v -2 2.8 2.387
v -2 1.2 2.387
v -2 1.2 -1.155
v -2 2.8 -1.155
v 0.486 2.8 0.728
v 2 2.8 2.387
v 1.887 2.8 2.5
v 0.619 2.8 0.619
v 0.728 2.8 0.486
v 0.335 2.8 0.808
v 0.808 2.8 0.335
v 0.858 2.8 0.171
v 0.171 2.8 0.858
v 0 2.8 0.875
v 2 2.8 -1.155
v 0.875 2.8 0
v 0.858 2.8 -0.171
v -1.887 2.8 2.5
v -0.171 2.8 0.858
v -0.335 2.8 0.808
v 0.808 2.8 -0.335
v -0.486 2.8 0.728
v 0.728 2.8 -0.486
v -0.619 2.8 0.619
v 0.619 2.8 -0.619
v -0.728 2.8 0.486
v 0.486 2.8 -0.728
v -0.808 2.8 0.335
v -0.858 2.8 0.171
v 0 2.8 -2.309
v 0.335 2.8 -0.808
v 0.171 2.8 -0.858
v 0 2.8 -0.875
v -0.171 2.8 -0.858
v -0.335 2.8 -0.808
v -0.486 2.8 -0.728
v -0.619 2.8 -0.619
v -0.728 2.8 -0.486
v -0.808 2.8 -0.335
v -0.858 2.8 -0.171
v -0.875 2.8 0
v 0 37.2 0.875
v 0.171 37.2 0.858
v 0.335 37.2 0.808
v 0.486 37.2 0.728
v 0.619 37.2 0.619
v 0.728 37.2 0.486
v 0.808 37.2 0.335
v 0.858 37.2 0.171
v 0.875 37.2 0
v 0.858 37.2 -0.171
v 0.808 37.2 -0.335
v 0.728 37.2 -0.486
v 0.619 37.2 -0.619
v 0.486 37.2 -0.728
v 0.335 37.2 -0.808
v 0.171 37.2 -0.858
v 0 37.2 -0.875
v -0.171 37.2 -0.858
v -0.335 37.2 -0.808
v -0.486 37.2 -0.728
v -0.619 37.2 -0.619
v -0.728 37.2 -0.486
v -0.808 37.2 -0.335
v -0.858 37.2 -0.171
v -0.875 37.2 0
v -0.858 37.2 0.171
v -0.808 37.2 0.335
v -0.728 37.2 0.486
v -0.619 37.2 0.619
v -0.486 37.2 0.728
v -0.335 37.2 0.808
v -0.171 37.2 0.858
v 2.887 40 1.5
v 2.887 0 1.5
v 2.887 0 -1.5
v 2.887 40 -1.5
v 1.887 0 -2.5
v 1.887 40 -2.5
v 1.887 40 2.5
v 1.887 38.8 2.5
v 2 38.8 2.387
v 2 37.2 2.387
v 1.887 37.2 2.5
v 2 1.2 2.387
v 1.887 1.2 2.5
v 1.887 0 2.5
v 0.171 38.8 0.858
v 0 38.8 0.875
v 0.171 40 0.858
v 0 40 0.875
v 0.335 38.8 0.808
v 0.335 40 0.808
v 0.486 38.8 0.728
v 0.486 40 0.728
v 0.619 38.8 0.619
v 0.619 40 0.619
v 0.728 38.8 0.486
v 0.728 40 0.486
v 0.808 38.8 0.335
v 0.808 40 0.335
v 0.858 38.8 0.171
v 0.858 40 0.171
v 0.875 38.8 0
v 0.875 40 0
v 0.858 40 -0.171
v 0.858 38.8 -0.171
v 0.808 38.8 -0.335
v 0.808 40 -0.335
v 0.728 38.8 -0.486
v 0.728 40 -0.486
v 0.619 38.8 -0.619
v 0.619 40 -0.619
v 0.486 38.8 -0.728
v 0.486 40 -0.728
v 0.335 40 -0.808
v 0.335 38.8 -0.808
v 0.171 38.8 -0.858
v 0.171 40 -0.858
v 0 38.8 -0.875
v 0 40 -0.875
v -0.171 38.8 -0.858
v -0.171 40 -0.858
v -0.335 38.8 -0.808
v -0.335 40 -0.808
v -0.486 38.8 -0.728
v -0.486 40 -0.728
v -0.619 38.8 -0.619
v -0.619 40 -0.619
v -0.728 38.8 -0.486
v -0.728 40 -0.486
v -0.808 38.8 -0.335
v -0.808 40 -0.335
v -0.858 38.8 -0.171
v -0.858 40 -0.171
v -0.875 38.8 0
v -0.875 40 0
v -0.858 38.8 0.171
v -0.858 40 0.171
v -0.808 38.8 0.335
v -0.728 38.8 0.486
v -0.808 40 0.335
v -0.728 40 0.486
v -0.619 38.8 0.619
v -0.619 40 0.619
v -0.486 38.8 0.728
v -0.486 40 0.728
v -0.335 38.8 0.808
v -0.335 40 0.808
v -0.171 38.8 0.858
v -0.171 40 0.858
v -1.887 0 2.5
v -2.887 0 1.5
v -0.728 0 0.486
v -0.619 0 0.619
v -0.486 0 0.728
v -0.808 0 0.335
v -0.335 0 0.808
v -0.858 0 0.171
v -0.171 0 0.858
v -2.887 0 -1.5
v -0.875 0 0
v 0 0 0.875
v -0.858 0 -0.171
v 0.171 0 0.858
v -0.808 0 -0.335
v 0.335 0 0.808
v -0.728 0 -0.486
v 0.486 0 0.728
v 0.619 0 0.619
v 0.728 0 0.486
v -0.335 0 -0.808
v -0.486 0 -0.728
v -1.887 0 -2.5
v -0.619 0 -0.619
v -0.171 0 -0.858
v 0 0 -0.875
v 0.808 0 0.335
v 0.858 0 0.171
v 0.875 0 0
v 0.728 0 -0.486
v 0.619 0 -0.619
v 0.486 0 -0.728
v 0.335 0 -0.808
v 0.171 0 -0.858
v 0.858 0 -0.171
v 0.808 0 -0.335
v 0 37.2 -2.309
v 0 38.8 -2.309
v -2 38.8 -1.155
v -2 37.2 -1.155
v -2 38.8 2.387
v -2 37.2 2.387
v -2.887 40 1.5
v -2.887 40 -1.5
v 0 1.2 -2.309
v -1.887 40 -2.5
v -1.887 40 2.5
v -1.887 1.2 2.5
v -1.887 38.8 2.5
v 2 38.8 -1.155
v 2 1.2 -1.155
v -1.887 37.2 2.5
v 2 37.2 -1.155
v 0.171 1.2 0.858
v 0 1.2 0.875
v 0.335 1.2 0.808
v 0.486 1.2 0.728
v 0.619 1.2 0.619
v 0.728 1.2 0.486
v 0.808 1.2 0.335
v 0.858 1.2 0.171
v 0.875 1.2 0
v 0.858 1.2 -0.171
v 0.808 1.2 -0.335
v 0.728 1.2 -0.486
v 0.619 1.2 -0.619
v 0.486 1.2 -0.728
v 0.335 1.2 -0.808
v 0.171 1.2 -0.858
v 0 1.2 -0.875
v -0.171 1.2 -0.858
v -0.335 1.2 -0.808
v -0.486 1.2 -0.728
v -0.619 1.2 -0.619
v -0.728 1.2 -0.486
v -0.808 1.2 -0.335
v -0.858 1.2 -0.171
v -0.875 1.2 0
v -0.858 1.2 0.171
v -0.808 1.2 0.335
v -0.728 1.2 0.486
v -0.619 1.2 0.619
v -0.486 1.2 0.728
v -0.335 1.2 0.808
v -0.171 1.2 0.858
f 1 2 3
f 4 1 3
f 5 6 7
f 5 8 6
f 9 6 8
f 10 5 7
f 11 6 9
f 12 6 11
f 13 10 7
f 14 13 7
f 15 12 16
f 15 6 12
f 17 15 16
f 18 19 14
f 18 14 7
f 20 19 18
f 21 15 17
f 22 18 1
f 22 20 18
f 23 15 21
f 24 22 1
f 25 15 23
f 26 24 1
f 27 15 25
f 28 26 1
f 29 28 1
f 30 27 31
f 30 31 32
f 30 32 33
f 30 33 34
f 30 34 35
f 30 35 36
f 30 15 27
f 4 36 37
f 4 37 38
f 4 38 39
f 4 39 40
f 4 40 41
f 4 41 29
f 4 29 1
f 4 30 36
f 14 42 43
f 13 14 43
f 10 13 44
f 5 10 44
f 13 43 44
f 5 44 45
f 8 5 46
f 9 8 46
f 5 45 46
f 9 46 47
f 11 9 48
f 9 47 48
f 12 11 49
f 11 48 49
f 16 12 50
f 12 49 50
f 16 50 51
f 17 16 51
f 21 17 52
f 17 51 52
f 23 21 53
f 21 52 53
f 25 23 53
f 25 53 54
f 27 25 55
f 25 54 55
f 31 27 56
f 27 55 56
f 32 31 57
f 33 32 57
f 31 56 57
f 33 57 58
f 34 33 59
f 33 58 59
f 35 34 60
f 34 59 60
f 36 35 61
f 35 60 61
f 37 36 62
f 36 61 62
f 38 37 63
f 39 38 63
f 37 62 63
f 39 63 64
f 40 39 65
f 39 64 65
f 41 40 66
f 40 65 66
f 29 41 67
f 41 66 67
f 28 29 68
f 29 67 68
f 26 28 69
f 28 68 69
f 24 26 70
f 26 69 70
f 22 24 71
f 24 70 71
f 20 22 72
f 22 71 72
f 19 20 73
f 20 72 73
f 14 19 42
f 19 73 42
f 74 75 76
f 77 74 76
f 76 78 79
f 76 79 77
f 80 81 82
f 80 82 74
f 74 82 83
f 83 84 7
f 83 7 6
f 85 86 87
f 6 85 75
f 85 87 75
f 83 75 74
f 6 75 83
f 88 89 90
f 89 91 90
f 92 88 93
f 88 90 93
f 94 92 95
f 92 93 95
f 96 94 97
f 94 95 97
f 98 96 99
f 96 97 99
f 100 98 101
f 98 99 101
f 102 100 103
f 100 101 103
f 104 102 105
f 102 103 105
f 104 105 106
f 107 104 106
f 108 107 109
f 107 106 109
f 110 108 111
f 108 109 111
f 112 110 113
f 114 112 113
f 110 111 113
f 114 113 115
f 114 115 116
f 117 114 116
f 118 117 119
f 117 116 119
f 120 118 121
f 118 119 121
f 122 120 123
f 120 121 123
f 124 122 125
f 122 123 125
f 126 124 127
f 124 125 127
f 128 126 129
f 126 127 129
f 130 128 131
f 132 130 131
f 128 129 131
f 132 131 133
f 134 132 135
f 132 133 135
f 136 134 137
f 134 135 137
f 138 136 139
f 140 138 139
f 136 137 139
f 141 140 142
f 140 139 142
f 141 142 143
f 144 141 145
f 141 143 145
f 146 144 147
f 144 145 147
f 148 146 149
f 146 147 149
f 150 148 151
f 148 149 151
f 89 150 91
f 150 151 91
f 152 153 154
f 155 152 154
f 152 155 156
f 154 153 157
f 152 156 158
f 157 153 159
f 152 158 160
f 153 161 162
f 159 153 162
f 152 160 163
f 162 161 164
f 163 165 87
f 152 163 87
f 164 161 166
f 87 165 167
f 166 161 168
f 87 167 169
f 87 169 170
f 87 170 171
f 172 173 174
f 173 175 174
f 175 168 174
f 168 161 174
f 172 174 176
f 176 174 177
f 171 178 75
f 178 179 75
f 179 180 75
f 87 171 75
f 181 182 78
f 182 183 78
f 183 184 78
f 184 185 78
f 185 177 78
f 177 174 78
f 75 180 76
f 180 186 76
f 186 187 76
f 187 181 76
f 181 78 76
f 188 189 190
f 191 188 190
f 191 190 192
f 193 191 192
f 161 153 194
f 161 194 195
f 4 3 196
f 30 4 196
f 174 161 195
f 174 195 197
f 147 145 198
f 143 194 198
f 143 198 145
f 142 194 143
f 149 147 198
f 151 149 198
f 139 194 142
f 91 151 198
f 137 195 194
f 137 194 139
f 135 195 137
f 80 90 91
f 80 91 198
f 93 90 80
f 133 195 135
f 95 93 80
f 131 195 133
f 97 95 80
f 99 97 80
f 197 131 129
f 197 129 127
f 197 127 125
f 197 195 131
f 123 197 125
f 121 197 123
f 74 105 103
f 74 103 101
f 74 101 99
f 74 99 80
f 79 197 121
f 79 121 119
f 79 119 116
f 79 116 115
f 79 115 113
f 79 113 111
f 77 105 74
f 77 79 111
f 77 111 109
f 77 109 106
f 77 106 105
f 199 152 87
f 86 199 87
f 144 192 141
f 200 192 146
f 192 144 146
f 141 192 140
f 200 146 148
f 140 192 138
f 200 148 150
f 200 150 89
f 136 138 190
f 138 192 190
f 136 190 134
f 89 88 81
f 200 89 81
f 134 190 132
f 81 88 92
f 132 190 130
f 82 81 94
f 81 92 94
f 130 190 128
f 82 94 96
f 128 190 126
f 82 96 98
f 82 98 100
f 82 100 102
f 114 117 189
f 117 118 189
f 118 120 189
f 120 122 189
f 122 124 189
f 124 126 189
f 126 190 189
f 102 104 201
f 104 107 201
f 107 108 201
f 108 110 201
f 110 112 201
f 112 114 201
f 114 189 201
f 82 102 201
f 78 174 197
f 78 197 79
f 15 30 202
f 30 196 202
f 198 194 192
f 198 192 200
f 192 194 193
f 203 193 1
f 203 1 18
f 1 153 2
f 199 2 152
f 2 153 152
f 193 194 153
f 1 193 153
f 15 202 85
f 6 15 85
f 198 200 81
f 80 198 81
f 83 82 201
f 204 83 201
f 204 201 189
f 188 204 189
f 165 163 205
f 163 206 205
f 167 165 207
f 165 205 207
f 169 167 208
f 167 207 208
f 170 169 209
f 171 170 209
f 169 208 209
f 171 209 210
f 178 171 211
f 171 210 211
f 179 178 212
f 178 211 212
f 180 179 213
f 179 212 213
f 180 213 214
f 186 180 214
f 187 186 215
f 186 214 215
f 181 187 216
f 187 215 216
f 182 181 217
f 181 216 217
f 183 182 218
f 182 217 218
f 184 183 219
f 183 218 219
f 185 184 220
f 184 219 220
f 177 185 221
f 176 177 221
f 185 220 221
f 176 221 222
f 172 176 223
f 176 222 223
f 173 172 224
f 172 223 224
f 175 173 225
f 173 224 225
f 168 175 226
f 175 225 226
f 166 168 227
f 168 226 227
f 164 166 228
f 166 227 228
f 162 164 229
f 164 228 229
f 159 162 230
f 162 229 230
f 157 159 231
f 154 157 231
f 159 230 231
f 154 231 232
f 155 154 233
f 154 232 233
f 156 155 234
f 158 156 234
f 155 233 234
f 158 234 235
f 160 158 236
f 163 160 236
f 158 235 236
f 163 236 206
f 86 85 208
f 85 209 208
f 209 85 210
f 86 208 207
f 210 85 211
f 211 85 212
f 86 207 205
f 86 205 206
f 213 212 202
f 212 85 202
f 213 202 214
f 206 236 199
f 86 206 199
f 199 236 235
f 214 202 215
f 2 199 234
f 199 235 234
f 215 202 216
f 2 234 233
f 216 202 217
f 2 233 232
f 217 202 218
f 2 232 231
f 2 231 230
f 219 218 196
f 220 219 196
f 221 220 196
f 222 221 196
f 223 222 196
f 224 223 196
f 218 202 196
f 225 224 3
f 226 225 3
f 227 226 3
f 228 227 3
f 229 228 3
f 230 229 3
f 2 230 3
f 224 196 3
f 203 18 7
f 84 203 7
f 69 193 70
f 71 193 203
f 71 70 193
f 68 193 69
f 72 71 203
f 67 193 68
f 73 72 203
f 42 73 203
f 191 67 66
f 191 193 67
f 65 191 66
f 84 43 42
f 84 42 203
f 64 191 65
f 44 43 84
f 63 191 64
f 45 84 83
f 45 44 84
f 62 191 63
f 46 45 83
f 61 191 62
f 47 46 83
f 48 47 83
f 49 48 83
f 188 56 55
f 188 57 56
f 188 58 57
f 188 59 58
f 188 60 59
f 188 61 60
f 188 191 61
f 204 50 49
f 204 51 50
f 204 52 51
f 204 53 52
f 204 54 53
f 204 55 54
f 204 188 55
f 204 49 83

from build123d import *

# Parameters (mm, degrees)
SKETCH_1_W              = 5.773502692
SKETCH_1_H              = 5
EXTRUDE_1_DEPTH         = 40
M2_2X0_45_1_D           = 1.75
M2_2X0_45_1_ON_FACE_2_D = 1.75
CUT_EXTRUDE_1_DEPTH     = 0.8
CUT_EXTRUDE_2_DEPTH     = 0.8
CHAMFER_1_SIZE          = 1


with BuildPart() as part:
    # 草图1 → 凸台-拉伸1 (new body)
    with BuildSketch(Plane(origin=(0, 0, 0), x_dir=(1, 0, 0), z_dir=(0, 1, 0))):
        Rectangle(SKETCH_1_W, SKETCH_1_H)
    extrude(amount=EXTRUDE_1_DEPTH)

    # M2.2x0.45 螺纹孔1 (through all)
    with Locations(Plane(origin=(0, 0, 0), x_dir=(0, 0, -1), z_dir=(0, -1, 0))):
        with Locations((0, 0)):
            Hole(M2_2X0_45_1_D / 2)

    # M2.2x0.45 螺纹孔1 on face 2 (through all)
    with Locations(Plane.ZX.offset(40)):
        with Locations((0, 0)):
            Hole(M2_2X0_45_1_ON_FACE_2_D / 2)

    # 草图5 → 切除-拉伸1 (cut, symmetric)
    with BuildSketch(Plane(origin=(0, 2, 0), x_dir=(-1, 0, 0), z_dir=(0, -1, 0))):
        Polygon((-2, -1.154700538), (-2, -2.5), (2, -2.5), (2, -1.154700538), (2, 1.154700538), (0, 2.309401077), (-2, 1.154700538), align=None)
    extrude(amount=CUT_EXTRUDE_1_DEPTH, both=True, mode=Mode.SUBTRACT)

    # 草图6 → 切除-拉伸2 (cut, symmetric)
    with BuildSketch(Plane(origin=(0, 38, 0), x_dir=(1, 0, 0), z_dir=(0, 1, 0))):
        Polygon((2, -2.5), (2, -1.154700538), (2, 1.154700538), (0, 2.309401077), (-2, 1.154700538), (-2, -1.154700538), (-2, -2.5), align=None)
    extrude(amount=CUT_EXTRUDE_2_DEPTH, both=True, mode=Mode.SUBTRACT)

    # 倒角1
    # the kernel refuses this chamfer: 1 mm, written as the material it takes off along each edge
    with BuildSketch(Plane(origin=(-2.886751346, -2.571682988, 2.5), x_dir=(-0.027495876610586494, 0, -0.9996219169112968), z_dir=(0, 1, 0)), Plane(origin=(2.886751346, -2.571682988, 2.5), x_dir=(-0.9996219169112965, 0, 0.027495876610591666), z_dir=(0, 1, 0))) as chamfer_1_piece_1:
        Polygon((CHAMFER_1_SIZE * 0.999621916911, -CHAMFER_1_SIZE * 0.0274958766106), (-CHAMFER_1_SIZE * 0.0274958766106, -CHAMFER_1_SIZE * 0.999621916911), (0, 0), align=None)
    extrude(amount=45.143365976, mode=Mode.SUBTRACT)
    with BuildSketch(Plane(origin=(-2.886751346, -2.571682988, -2.5), x_dir=(-0.027495876610586487, 0, 0.9996219169112968), z_dir=(0, 1, 0)), Plane(origin=(2.886751346, -2.571682988, -2.5), x_dir=(-0.9996219169112968, 0, -0.02749587661058476), z_dir=(0, 1, 0))) as chamfer_1_piece_2:
        Polygon((CHAMFER_1_SIZE * 0.999621916911, CHAMFER_1_SIZE * 0.0274958766106), (-CHAMFER_1_SIZE * 0.0274958766106, CHAMFER_1_SIZE * 0.999621916911), (0, 0), align=None)
    extrude(amount=45.143365976, mode=Mode.SUBTRACT)


solid = part.part
